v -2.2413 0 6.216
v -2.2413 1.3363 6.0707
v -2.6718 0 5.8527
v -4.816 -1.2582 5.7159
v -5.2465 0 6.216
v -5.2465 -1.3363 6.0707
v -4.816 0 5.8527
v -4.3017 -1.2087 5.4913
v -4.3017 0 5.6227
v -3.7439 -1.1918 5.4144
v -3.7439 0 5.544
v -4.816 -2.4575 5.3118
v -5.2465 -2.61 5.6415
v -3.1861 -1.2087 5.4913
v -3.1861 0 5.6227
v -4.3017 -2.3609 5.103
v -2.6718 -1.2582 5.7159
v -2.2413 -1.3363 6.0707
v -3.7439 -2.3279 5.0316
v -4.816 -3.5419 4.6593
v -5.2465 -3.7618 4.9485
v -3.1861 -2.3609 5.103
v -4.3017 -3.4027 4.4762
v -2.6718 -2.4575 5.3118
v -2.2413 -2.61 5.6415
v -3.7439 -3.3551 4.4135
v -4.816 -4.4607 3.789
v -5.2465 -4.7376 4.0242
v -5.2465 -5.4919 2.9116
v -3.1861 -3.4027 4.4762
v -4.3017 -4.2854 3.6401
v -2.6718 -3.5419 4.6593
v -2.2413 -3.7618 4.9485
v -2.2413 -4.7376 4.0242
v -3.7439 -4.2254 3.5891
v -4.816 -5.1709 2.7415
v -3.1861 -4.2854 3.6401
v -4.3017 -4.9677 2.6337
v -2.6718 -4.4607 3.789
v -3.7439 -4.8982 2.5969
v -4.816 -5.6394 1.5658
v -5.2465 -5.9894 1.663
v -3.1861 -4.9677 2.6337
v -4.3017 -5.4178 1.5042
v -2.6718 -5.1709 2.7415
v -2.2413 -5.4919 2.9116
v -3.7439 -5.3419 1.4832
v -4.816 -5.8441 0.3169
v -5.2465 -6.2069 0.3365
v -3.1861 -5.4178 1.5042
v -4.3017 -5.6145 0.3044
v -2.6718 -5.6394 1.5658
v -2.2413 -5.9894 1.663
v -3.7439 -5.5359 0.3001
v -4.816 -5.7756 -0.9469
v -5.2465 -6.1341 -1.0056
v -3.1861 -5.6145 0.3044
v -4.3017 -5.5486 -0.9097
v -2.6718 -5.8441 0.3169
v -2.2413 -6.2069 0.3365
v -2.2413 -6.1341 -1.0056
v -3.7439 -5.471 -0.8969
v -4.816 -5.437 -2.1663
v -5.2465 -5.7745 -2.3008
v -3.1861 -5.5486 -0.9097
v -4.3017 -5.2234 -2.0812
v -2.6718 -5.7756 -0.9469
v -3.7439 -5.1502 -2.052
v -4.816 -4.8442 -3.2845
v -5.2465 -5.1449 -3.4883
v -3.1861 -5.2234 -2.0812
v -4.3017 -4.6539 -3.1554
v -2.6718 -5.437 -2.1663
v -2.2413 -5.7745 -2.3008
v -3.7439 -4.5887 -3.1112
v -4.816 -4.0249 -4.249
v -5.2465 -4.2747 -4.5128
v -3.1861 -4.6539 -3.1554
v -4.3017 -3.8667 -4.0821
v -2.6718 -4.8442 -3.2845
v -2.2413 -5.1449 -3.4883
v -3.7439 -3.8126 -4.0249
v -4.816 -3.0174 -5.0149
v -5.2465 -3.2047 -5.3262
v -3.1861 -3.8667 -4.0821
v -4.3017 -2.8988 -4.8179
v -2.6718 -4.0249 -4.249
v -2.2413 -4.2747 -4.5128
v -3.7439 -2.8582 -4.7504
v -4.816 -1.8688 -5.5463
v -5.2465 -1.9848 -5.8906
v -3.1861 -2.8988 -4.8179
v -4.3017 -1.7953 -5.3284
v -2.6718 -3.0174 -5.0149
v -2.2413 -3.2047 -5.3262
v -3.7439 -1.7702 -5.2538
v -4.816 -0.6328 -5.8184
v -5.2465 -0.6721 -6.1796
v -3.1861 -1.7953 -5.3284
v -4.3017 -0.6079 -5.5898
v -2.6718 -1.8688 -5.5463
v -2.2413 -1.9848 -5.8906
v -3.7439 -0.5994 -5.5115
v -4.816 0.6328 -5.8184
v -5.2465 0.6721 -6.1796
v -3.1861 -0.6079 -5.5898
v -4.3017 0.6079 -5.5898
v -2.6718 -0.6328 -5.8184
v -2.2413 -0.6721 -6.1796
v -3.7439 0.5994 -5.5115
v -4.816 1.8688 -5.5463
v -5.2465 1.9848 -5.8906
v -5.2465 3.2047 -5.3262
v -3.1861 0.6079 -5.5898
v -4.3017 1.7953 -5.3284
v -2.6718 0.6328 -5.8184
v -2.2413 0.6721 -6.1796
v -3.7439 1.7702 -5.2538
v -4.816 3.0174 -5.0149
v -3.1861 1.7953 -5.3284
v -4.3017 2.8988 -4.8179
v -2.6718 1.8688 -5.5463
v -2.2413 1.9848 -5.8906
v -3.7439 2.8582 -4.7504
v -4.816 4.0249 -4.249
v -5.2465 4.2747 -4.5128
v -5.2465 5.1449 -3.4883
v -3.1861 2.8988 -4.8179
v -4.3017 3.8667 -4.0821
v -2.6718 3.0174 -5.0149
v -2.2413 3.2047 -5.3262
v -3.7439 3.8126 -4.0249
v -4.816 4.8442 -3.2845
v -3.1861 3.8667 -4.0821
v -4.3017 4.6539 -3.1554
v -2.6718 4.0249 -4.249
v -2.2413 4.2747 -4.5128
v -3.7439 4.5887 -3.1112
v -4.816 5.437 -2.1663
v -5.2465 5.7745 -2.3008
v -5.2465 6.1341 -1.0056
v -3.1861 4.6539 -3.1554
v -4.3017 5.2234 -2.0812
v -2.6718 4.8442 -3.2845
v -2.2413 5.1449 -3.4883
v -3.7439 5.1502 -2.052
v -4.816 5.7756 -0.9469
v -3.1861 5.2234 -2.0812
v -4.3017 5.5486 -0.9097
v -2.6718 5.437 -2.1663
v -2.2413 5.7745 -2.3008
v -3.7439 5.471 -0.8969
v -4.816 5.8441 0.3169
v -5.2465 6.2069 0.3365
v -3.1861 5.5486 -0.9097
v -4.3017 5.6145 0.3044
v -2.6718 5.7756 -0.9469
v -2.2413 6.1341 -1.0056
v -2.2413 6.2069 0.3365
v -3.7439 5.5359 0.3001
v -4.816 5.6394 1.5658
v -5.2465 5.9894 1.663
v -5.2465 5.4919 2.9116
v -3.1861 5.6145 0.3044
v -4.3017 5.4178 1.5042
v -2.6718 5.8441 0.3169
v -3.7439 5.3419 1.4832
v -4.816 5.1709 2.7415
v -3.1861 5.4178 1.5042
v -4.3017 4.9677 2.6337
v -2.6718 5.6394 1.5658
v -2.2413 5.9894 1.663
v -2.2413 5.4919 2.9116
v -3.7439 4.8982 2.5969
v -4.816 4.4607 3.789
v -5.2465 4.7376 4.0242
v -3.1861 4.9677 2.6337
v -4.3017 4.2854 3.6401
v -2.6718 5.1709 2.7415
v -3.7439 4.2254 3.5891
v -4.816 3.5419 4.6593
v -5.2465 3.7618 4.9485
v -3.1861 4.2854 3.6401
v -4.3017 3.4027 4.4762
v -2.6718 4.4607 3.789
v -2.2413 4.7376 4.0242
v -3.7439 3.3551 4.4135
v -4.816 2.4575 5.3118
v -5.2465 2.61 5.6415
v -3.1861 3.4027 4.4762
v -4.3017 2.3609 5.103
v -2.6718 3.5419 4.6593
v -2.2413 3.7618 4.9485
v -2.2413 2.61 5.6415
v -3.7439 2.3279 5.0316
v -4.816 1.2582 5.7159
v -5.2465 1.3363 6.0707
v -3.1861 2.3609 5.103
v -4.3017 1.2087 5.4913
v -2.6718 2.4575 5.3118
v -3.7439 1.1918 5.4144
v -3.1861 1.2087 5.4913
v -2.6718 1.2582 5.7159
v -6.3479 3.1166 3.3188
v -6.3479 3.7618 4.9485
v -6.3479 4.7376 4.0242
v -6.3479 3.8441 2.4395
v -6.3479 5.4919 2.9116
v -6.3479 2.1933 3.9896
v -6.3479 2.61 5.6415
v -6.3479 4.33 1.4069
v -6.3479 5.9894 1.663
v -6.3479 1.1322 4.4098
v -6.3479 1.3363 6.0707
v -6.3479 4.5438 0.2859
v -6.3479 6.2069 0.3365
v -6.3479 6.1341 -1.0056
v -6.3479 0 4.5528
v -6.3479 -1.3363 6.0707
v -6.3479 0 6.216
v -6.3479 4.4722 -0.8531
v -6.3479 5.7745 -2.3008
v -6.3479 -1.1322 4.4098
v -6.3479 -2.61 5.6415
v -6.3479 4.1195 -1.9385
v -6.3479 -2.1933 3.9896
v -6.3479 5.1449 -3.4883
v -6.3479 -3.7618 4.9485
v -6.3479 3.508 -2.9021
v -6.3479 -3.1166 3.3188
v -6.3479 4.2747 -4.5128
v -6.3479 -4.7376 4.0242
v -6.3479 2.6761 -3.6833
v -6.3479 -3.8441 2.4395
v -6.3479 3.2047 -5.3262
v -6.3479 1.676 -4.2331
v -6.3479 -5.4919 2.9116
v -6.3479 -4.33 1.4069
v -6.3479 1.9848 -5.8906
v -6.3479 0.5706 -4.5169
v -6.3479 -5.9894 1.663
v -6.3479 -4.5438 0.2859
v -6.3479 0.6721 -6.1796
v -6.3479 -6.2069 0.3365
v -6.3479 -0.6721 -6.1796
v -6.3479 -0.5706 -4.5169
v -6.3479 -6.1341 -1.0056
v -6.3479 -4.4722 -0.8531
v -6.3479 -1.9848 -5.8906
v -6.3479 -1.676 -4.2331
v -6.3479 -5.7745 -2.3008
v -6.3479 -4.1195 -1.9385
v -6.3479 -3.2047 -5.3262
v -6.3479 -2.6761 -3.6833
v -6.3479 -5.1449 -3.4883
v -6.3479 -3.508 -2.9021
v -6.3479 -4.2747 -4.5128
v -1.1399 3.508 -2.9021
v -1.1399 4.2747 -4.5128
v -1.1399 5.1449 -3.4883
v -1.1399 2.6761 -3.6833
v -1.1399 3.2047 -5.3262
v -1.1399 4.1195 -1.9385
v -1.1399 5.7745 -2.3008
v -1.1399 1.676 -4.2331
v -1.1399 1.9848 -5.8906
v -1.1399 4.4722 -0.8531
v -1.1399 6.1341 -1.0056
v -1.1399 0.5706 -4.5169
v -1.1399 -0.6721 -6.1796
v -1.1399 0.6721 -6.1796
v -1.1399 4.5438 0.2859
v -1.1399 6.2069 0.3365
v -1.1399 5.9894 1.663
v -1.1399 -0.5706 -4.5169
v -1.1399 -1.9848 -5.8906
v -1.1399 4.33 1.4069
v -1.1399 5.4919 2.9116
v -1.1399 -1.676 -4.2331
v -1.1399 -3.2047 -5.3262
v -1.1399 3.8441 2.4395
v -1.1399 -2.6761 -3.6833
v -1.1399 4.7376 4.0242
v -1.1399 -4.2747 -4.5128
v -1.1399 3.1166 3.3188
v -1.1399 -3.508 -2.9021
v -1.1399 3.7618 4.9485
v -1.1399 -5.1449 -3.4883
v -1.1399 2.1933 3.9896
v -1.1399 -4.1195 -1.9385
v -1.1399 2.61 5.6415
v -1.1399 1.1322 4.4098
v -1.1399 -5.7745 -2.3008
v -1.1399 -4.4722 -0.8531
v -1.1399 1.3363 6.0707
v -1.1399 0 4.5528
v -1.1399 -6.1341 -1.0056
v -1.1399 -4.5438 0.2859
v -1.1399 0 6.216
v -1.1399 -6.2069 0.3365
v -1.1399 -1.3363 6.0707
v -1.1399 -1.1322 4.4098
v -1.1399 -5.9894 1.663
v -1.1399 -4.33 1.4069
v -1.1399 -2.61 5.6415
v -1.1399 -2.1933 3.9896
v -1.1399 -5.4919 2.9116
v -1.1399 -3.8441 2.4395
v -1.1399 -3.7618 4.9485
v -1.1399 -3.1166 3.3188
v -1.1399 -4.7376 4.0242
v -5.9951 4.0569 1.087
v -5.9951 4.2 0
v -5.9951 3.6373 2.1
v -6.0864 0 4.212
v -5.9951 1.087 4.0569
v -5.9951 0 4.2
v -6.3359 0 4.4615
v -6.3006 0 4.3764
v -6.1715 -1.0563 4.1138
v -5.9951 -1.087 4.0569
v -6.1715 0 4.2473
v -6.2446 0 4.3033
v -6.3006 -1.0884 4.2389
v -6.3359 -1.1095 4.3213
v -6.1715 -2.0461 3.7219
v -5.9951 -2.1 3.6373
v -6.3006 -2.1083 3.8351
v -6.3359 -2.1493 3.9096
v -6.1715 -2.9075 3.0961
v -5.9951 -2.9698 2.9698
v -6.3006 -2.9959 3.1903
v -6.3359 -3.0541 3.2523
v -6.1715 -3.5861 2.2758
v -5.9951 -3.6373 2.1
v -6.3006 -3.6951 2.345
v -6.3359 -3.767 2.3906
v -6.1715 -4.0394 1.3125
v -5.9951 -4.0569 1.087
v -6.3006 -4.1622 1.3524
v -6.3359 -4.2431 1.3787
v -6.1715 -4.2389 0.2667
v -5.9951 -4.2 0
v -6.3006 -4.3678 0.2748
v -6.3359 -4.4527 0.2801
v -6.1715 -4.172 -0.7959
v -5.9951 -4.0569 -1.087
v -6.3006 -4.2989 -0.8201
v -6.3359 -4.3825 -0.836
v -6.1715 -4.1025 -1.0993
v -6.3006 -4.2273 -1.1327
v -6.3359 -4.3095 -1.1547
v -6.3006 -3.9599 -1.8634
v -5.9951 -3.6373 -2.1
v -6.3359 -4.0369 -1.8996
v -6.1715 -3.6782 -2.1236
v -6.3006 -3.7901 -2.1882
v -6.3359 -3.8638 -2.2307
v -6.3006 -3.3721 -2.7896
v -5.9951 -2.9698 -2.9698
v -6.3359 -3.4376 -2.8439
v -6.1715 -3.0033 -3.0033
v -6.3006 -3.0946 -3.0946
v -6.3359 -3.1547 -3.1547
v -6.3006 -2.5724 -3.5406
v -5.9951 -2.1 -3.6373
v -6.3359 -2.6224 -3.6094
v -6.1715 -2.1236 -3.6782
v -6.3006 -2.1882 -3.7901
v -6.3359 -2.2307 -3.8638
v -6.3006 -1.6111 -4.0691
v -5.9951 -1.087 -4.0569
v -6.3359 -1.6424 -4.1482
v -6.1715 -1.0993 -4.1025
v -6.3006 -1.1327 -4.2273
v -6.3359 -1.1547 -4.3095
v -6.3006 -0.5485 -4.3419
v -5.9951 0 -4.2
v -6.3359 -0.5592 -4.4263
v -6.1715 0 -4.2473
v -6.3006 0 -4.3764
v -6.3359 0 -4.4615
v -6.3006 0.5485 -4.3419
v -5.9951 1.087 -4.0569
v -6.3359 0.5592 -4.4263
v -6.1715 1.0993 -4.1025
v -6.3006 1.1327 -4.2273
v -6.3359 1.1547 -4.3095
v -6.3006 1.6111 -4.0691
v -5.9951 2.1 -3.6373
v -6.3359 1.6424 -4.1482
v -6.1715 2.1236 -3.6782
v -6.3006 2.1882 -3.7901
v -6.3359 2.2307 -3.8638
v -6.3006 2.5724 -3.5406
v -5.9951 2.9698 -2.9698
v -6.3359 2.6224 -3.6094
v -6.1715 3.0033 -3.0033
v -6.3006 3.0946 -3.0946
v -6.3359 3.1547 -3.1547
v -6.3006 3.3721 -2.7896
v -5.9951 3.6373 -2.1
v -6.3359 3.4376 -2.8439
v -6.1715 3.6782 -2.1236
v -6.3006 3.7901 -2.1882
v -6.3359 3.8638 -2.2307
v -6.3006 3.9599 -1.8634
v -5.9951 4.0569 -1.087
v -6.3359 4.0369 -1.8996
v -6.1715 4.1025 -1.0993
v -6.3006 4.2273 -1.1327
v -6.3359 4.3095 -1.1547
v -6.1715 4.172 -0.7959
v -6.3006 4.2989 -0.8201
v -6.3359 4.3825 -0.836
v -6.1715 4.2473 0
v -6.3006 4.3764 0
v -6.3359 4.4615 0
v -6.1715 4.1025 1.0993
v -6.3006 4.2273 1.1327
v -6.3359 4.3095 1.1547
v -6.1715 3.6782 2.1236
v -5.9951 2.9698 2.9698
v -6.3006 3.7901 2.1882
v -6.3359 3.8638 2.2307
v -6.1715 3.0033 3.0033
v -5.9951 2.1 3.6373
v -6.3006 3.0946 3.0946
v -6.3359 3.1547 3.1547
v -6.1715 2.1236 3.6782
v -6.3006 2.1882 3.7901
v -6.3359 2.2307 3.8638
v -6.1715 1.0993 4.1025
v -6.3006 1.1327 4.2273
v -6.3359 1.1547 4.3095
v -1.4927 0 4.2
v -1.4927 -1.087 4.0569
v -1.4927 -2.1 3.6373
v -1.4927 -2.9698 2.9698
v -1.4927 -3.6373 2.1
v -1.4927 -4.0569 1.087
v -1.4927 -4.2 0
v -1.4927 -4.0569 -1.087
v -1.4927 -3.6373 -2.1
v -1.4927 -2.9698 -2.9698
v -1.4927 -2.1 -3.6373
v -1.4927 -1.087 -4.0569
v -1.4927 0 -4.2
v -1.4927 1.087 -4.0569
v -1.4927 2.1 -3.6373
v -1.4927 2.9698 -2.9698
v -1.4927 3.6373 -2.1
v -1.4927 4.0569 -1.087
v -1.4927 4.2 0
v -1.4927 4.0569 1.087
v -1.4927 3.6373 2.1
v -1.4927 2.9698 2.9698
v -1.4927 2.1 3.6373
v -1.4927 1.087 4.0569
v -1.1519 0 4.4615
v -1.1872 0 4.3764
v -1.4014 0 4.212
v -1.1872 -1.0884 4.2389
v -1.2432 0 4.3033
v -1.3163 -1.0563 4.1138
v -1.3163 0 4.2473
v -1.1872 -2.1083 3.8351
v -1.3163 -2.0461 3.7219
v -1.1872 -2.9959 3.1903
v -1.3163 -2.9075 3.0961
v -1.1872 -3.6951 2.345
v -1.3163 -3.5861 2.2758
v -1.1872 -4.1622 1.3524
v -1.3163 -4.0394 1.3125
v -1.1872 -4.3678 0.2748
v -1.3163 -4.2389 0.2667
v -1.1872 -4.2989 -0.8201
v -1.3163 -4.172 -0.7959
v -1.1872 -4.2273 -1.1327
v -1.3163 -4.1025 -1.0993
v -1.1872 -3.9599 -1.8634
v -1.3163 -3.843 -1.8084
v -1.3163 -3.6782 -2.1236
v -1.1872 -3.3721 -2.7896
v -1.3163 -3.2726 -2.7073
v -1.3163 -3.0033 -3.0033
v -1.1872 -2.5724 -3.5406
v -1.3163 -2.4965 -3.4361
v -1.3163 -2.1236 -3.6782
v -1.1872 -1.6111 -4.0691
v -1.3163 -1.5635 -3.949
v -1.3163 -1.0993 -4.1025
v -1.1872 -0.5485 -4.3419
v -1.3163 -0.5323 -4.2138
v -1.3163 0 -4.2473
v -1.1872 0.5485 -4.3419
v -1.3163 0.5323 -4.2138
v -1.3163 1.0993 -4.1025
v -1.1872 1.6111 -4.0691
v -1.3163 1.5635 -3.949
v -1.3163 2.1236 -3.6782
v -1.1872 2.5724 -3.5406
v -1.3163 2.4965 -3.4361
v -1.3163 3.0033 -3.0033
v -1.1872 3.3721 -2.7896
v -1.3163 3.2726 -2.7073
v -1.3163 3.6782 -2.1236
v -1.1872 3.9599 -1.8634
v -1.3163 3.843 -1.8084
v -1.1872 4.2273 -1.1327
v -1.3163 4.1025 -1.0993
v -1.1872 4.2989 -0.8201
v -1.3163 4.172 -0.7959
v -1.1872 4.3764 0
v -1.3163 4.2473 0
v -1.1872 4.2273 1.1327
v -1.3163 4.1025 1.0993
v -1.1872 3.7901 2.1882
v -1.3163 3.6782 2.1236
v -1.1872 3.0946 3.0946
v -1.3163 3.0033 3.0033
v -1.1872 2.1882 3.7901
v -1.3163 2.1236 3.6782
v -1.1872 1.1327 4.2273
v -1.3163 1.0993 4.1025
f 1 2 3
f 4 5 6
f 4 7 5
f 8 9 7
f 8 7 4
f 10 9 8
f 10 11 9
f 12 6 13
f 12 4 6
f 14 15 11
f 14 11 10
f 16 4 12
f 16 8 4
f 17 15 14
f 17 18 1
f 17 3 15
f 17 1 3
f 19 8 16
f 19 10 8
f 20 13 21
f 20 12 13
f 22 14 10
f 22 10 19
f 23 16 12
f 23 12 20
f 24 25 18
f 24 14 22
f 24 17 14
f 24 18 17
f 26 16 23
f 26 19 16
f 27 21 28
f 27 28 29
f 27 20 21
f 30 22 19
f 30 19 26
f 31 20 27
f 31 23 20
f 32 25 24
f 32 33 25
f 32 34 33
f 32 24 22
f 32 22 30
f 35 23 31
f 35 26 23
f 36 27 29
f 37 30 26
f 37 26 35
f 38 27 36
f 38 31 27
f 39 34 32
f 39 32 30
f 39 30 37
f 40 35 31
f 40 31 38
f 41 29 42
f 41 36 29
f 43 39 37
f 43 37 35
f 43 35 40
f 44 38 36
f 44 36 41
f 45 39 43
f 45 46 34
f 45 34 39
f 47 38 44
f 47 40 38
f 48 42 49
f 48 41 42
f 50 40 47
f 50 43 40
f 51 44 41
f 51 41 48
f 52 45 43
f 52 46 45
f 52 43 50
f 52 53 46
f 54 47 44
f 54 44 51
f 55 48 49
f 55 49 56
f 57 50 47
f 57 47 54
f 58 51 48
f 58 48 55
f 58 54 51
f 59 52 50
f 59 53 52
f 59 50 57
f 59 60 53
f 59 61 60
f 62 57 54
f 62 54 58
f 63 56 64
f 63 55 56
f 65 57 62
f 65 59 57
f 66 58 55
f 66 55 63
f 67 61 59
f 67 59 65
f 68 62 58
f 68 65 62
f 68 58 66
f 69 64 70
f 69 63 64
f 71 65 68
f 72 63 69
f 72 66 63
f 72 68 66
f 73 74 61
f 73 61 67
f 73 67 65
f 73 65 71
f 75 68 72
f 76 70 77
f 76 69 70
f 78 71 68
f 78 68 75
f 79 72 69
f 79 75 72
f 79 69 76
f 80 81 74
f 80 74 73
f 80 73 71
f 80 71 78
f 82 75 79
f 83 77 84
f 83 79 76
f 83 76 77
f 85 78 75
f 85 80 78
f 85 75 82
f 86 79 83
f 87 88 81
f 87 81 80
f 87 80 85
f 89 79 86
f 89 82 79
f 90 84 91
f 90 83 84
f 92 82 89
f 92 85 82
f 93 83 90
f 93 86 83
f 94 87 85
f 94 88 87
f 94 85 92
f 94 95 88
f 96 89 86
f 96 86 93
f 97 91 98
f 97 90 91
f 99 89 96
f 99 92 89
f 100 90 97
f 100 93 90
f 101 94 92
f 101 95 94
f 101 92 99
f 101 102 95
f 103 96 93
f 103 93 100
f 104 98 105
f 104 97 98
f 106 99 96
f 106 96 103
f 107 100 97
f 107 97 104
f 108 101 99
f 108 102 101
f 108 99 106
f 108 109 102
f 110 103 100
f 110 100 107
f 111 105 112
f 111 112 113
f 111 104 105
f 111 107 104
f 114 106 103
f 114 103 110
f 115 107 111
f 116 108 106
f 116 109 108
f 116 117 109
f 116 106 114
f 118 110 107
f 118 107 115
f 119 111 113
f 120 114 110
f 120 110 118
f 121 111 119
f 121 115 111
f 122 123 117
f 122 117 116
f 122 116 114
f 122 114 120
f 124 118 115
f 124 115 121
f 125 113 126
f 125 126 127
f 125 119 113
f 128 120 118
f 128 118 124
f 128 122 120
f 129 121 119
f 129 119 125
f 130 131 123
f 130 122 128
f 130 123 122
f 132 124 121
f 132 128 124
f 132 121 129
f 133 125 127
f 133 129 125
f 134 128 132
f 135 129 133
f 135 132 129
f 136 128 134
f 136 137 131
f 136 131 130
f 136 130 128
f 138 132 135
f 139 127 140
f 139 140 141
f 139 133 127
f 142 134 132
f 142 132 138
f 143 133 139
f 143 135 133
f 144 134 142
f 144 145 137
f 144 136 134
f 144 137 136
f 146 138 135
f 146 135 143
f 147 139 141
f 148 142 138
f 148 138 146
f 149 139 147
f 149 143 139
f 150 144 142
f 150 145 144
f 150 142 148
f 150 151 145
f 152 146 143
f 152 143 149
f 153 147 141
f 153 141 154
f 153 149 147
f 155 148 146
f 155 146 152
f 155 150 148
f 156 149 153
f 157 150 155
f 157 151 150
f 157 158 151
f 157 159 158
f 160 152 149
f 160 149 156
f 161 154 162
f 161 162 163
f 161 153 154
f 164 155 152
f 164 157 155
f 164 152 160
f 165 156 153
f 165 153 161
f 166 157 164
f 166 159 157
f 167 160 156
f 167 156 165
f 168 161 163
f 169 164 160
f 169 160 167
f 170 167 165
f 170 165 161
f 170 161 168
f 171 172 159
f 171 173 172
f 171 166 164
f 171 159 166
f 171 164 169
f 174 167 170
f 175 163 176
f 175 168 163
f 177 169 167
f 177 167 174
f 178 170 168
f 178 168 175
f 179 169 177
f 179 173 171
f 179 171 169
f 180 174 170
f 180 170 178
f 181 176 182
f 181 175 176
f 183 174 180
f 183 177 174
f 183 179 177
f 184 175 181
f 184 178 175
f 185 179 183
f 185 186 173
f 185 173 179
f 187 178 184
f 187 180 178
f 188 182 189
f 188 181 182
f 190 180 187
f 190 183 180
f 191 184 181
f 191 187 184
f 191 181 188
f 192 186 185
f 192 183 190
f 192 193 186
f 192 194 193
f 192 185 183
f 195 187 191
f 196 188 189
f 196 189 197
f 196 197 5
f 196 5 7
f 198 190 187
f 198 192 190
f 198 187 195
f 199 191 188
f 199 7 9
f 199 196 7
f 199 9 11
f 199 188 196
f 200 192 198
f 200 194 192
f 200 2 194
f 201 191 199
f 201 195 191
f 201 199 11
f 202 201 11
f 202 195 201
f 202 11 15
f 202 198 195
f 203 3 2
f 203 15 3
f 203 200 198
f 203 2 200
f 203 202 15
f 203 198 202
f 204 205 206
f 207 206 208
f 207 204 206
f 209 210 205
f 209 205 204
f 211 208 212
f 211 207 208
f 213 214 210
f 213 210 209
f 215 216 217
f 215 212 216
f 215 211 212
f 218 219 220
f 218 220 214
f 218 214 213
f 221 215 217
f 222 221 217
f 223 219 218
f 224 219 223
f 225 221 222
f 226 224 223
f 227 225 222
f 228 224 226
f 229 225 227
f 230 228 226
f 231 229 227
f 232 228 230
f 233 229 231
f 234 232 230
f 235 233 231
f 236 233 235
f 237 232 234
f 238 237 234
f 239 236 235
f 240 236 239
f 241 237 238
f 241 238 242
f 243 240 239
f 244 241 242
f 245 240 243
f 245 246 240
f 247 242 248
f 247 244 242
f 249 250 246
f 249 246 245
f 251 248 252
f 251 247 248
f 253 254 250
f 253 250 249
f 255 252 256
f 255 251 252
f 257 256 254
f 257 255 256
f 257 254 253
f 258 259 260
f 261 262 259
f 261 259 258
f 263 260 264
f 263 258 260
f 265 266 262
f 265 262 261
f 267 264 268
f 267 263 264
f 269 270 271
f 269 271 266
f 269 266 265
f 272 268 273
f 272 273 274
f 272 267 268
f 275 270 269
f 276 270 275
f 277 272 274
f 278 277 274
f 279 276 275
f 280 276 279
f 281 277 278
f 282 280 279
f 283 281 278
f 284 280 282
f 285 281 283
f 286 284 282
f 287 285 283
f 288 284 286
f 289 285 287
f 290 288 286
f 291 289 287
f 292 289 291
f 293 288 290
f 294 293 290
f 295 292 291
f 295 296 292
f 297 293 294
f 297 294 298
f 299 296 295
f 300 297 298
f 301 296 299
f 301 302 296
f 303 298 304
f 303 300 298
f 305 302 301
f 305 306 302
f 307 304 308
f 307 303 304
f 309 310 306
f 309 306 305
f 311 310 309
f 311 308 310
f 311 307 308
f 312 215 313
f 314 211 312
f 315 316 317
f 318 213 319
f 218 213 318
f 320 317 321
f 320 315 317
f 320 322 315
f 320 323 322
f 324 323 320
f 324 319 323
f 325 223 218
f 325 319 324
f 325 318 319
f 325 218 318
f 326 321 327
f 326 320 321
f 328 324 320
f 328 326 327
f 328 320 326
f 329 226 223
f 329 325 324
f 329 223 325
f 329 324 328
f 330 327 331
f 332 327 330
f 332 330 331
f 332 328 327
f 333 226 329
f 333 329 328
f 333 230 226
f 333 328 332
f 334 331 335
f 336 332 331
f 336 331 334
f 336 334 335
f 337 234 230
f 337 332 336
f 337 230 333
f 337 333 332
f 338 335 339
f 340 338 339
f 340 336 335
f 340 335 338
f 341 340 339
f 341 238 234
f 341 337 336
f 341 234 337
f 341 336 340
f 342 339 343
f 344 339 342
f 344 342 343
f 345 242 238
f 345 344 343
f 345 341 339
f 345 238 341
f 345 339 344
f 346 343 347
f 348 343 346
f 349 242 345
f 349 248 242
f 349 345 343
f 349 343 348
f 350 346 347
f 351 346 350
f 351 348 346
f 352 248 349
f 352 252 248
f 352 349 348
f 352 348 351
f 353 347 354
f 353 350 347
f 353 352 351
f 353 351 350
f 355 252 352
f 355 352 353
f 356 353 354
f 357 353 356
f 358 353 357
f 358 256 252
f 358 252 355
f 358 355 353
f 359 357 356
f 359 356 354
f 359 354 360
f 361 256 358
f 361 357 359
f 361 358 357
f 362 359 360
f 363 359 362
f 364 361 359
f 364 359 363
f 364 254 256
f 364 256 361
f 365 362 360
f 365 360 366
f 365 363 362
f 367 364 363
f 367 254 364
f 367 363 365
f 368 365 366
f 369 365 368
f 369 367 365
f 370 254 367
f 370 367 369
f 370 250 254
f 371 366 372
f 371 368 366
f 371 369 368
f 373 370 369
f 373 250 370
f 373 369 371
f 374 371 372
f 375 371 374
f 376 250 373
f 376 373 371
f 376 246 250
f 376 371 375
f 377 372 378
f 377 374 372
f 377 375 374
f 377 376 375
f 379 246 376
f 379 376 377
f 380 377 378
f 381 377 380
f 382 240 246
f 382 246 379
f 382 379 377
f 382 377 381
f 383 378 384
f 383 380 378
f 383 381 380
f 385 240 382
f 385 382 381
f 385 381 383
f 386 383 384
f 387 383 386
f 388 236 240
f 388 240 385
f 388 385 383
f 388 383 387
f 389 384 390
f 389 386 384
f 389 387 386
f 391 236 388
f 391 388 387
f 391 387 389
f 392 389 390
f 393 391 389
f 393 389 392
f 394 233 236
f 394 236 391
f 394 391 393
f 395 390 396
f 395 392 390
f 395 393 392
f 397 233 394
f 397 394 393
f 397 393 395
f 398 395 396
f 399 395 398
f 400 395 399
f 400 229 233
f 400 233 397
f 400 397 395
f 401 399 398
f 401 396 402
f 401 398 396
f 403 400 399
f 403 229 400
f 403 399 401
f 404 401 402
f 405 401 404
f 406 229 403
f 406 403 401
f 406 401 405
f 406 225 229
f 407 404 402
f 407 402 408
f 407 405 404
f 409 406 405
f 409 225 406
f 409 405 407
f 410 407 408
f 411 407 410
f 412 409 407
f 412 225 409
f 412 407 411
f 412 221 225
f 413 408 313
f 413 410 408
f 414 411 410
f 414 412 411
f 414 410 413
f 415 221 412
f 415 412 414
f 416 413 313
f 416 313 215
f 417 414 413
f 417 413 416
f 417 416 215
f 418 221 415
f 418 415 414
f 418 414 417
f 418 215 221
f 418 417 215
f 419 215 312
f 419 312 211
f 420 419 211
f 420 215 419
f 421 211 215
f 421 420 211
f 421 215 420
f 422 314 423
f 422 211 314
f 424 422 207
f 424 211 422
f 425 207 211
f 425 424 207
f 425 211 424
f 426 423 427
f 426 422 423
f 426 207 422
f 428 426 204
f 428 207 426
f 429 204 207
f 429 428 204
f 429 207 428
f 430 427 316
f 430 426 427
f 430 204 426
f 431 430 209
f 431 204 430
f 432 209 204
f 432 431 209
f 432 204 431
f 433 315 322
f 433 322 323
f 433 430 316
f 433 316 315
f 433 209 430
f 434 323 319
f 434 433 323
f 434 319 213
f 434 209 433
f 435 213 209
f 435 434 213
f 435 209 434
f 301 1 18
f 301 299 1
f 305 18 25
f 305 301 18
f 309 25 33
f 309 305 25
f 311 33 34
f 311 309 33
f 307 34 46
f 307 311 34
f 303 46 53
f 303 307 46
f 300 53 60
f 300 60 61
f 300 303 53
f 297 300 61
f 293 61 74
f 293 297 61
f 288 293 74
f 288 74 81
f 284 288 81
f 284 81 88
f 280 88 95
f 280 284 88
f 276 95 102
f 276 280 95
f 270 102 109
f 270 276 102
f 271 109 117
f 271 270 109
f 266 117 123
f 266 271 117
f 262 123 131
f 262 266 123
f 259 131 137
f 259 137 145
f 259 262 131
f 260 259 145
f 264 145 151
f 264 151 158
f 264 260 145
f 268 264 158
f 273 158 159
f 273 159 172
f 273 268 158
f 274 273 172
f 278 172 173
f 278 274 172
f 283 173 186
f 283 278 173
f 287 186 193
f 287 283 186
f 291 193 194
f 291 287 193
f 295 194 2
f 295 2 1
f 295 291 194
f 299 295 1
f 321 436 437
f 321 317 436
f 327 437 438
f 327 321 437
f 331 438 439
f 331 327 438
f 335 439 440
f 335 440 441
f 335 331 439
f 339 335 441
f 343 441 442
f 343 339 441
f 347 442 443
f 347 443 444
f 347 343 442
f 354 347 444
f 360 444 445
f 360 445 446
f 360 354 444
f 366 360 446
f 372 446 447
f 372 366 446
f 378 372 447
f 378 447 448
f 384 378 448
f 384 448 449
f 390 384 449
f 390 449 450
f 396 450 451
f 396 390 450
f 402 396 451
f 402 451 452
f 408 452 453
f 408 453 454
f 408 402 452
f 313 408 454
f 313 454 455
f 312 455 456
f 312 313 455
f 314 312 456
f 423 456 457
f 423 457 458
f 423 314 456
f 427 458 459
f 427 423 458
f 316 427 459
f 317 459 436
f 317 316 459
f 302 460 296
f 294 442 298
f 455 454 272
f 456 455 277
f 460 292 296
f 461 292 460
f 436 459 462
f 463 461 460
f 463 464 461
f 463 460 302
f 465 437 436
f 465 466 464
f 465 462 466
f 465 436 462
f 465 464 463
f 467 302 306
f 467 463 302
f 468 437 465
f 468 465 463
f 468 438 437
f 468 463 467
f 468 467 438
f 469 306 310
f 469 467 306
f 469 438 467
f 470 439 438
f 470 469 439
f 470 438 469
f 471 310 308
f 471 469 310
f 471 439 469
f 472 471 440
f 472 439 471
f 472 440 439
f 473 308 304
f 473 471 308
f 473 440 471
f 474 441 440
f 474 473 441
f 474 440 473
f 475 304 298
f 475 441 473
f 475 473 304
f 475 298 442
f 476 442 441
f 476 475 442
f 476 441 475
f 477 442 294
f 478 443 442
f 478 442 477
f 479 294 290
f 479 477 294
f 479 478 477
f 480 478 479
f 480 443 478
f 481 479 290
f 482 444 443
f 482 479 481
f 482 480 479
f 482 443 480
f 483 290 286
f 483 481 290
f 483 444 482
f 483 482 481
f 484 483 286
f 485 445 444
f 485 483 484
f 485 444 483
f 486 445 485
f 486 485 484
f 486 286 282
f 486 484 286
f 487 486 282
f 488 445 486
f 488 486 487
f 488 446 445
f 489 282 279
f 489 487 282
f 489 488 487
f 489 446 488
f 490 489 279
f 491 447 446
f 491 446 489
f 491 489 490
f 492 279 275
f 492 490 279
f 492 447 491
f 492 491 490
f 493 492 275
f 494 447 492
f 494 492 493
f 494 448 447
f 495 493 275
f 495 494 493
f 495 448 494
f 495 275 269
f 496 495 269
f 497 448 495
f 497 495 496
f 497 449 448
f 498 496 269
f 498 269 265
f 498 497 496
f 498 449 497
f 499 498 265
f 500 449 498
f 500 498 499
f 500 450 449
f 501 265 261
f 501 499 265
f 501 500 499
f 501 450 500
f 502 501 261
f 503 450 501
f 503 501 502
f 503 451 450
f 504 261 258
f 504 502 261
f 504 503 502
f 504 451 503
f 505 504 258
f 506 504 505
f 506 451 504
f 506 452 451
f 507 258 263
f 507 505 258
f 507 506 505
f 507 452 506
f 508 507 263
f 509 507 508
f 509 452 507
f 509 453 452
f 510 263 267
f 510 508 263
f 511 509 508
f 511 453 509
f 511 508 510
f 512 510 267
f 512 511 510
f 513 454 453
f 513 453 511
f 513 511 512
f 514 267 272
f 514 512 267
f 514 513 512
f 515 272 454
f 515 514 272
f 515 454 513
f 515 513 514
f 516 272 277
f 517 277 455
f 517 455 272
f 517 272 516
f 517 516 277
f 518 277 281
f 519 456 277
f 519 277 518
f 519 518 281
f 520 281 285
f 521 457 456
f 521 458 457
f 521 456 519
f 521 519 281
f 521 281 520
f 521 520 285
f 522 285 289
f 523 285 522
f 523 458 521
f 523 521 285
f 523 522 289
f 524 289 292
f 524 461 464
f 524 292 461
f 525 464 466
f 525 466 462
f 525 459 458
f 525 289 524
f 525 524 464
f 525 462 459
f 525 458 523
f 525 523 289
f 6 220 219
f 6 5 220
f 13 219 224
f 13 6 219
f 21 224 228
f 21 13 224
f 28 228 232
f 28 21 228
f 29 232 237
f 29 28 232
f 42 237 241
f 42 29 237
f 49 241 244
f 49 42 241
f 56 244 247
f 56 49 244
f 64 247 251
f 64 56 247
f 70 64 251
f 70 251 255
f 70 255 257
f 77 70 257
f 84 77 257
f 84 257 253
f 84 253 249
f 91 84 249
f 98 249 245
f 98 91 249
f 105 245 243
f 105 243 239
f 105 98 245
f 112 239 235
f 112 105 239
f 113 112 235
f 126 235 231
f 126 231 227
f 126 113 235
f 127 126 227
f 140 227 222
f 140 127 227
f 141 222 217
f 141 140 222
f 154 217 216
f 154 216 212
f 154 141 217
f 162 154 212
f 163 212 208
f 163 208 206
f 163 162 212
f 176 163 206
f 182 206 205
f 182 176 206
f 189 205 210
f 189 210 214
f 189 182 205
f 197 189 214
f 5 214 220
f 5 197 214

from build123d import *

# Parameters (mm, degrees)
SCALE1_SCALE = 0.168


with BuildPart() as part:
    # Sketch1 → Revolve1 (revolve)
    with BuildSketch(Plane.XY, mode=Mode.PRIVATE) as revolve1_sk:
        with BuildLine():
            Line((-19.243896498, 37), (-12.688168408, 37))
            ThreePointArc((-12.688168408, 37), (-3.743896498, 33), (5.200375412, 37))
            Line((5.200375412, 37), (11.756103502, 37))
            Line((11.756103502, 37), (11.756103502, 27.1))
            ThreePointArc((11.756103502, 27.1), (11.141027743, 25.61507576), (9.656103502, 25))
            Line((9.656103502, 25), (-17.143896498, 25))
            ThreePointArc((-17.143896498, 25), (-18.628820738, 25.61507576), (-19.243896498, 27.1))
            Line((-19.243896498, 27.1), (-19.243896498, 37))
        make_face()
    revolve(revolve1_sk.sketch.rotate(Axis((-29.974665728, 0, 0), (1, 0, 0)), 90), axis=Axis((-29.974665728, 0, 0), (1, 0, 0)))


with BuildPart() as part_1:
    # Scale1: scaled about (-3.743896498, 0, 0)
    add(part.part.scale(SCALE1_SCALE).moved(Location((-3.114921886, 0, 0))))


solid = part_1.part
